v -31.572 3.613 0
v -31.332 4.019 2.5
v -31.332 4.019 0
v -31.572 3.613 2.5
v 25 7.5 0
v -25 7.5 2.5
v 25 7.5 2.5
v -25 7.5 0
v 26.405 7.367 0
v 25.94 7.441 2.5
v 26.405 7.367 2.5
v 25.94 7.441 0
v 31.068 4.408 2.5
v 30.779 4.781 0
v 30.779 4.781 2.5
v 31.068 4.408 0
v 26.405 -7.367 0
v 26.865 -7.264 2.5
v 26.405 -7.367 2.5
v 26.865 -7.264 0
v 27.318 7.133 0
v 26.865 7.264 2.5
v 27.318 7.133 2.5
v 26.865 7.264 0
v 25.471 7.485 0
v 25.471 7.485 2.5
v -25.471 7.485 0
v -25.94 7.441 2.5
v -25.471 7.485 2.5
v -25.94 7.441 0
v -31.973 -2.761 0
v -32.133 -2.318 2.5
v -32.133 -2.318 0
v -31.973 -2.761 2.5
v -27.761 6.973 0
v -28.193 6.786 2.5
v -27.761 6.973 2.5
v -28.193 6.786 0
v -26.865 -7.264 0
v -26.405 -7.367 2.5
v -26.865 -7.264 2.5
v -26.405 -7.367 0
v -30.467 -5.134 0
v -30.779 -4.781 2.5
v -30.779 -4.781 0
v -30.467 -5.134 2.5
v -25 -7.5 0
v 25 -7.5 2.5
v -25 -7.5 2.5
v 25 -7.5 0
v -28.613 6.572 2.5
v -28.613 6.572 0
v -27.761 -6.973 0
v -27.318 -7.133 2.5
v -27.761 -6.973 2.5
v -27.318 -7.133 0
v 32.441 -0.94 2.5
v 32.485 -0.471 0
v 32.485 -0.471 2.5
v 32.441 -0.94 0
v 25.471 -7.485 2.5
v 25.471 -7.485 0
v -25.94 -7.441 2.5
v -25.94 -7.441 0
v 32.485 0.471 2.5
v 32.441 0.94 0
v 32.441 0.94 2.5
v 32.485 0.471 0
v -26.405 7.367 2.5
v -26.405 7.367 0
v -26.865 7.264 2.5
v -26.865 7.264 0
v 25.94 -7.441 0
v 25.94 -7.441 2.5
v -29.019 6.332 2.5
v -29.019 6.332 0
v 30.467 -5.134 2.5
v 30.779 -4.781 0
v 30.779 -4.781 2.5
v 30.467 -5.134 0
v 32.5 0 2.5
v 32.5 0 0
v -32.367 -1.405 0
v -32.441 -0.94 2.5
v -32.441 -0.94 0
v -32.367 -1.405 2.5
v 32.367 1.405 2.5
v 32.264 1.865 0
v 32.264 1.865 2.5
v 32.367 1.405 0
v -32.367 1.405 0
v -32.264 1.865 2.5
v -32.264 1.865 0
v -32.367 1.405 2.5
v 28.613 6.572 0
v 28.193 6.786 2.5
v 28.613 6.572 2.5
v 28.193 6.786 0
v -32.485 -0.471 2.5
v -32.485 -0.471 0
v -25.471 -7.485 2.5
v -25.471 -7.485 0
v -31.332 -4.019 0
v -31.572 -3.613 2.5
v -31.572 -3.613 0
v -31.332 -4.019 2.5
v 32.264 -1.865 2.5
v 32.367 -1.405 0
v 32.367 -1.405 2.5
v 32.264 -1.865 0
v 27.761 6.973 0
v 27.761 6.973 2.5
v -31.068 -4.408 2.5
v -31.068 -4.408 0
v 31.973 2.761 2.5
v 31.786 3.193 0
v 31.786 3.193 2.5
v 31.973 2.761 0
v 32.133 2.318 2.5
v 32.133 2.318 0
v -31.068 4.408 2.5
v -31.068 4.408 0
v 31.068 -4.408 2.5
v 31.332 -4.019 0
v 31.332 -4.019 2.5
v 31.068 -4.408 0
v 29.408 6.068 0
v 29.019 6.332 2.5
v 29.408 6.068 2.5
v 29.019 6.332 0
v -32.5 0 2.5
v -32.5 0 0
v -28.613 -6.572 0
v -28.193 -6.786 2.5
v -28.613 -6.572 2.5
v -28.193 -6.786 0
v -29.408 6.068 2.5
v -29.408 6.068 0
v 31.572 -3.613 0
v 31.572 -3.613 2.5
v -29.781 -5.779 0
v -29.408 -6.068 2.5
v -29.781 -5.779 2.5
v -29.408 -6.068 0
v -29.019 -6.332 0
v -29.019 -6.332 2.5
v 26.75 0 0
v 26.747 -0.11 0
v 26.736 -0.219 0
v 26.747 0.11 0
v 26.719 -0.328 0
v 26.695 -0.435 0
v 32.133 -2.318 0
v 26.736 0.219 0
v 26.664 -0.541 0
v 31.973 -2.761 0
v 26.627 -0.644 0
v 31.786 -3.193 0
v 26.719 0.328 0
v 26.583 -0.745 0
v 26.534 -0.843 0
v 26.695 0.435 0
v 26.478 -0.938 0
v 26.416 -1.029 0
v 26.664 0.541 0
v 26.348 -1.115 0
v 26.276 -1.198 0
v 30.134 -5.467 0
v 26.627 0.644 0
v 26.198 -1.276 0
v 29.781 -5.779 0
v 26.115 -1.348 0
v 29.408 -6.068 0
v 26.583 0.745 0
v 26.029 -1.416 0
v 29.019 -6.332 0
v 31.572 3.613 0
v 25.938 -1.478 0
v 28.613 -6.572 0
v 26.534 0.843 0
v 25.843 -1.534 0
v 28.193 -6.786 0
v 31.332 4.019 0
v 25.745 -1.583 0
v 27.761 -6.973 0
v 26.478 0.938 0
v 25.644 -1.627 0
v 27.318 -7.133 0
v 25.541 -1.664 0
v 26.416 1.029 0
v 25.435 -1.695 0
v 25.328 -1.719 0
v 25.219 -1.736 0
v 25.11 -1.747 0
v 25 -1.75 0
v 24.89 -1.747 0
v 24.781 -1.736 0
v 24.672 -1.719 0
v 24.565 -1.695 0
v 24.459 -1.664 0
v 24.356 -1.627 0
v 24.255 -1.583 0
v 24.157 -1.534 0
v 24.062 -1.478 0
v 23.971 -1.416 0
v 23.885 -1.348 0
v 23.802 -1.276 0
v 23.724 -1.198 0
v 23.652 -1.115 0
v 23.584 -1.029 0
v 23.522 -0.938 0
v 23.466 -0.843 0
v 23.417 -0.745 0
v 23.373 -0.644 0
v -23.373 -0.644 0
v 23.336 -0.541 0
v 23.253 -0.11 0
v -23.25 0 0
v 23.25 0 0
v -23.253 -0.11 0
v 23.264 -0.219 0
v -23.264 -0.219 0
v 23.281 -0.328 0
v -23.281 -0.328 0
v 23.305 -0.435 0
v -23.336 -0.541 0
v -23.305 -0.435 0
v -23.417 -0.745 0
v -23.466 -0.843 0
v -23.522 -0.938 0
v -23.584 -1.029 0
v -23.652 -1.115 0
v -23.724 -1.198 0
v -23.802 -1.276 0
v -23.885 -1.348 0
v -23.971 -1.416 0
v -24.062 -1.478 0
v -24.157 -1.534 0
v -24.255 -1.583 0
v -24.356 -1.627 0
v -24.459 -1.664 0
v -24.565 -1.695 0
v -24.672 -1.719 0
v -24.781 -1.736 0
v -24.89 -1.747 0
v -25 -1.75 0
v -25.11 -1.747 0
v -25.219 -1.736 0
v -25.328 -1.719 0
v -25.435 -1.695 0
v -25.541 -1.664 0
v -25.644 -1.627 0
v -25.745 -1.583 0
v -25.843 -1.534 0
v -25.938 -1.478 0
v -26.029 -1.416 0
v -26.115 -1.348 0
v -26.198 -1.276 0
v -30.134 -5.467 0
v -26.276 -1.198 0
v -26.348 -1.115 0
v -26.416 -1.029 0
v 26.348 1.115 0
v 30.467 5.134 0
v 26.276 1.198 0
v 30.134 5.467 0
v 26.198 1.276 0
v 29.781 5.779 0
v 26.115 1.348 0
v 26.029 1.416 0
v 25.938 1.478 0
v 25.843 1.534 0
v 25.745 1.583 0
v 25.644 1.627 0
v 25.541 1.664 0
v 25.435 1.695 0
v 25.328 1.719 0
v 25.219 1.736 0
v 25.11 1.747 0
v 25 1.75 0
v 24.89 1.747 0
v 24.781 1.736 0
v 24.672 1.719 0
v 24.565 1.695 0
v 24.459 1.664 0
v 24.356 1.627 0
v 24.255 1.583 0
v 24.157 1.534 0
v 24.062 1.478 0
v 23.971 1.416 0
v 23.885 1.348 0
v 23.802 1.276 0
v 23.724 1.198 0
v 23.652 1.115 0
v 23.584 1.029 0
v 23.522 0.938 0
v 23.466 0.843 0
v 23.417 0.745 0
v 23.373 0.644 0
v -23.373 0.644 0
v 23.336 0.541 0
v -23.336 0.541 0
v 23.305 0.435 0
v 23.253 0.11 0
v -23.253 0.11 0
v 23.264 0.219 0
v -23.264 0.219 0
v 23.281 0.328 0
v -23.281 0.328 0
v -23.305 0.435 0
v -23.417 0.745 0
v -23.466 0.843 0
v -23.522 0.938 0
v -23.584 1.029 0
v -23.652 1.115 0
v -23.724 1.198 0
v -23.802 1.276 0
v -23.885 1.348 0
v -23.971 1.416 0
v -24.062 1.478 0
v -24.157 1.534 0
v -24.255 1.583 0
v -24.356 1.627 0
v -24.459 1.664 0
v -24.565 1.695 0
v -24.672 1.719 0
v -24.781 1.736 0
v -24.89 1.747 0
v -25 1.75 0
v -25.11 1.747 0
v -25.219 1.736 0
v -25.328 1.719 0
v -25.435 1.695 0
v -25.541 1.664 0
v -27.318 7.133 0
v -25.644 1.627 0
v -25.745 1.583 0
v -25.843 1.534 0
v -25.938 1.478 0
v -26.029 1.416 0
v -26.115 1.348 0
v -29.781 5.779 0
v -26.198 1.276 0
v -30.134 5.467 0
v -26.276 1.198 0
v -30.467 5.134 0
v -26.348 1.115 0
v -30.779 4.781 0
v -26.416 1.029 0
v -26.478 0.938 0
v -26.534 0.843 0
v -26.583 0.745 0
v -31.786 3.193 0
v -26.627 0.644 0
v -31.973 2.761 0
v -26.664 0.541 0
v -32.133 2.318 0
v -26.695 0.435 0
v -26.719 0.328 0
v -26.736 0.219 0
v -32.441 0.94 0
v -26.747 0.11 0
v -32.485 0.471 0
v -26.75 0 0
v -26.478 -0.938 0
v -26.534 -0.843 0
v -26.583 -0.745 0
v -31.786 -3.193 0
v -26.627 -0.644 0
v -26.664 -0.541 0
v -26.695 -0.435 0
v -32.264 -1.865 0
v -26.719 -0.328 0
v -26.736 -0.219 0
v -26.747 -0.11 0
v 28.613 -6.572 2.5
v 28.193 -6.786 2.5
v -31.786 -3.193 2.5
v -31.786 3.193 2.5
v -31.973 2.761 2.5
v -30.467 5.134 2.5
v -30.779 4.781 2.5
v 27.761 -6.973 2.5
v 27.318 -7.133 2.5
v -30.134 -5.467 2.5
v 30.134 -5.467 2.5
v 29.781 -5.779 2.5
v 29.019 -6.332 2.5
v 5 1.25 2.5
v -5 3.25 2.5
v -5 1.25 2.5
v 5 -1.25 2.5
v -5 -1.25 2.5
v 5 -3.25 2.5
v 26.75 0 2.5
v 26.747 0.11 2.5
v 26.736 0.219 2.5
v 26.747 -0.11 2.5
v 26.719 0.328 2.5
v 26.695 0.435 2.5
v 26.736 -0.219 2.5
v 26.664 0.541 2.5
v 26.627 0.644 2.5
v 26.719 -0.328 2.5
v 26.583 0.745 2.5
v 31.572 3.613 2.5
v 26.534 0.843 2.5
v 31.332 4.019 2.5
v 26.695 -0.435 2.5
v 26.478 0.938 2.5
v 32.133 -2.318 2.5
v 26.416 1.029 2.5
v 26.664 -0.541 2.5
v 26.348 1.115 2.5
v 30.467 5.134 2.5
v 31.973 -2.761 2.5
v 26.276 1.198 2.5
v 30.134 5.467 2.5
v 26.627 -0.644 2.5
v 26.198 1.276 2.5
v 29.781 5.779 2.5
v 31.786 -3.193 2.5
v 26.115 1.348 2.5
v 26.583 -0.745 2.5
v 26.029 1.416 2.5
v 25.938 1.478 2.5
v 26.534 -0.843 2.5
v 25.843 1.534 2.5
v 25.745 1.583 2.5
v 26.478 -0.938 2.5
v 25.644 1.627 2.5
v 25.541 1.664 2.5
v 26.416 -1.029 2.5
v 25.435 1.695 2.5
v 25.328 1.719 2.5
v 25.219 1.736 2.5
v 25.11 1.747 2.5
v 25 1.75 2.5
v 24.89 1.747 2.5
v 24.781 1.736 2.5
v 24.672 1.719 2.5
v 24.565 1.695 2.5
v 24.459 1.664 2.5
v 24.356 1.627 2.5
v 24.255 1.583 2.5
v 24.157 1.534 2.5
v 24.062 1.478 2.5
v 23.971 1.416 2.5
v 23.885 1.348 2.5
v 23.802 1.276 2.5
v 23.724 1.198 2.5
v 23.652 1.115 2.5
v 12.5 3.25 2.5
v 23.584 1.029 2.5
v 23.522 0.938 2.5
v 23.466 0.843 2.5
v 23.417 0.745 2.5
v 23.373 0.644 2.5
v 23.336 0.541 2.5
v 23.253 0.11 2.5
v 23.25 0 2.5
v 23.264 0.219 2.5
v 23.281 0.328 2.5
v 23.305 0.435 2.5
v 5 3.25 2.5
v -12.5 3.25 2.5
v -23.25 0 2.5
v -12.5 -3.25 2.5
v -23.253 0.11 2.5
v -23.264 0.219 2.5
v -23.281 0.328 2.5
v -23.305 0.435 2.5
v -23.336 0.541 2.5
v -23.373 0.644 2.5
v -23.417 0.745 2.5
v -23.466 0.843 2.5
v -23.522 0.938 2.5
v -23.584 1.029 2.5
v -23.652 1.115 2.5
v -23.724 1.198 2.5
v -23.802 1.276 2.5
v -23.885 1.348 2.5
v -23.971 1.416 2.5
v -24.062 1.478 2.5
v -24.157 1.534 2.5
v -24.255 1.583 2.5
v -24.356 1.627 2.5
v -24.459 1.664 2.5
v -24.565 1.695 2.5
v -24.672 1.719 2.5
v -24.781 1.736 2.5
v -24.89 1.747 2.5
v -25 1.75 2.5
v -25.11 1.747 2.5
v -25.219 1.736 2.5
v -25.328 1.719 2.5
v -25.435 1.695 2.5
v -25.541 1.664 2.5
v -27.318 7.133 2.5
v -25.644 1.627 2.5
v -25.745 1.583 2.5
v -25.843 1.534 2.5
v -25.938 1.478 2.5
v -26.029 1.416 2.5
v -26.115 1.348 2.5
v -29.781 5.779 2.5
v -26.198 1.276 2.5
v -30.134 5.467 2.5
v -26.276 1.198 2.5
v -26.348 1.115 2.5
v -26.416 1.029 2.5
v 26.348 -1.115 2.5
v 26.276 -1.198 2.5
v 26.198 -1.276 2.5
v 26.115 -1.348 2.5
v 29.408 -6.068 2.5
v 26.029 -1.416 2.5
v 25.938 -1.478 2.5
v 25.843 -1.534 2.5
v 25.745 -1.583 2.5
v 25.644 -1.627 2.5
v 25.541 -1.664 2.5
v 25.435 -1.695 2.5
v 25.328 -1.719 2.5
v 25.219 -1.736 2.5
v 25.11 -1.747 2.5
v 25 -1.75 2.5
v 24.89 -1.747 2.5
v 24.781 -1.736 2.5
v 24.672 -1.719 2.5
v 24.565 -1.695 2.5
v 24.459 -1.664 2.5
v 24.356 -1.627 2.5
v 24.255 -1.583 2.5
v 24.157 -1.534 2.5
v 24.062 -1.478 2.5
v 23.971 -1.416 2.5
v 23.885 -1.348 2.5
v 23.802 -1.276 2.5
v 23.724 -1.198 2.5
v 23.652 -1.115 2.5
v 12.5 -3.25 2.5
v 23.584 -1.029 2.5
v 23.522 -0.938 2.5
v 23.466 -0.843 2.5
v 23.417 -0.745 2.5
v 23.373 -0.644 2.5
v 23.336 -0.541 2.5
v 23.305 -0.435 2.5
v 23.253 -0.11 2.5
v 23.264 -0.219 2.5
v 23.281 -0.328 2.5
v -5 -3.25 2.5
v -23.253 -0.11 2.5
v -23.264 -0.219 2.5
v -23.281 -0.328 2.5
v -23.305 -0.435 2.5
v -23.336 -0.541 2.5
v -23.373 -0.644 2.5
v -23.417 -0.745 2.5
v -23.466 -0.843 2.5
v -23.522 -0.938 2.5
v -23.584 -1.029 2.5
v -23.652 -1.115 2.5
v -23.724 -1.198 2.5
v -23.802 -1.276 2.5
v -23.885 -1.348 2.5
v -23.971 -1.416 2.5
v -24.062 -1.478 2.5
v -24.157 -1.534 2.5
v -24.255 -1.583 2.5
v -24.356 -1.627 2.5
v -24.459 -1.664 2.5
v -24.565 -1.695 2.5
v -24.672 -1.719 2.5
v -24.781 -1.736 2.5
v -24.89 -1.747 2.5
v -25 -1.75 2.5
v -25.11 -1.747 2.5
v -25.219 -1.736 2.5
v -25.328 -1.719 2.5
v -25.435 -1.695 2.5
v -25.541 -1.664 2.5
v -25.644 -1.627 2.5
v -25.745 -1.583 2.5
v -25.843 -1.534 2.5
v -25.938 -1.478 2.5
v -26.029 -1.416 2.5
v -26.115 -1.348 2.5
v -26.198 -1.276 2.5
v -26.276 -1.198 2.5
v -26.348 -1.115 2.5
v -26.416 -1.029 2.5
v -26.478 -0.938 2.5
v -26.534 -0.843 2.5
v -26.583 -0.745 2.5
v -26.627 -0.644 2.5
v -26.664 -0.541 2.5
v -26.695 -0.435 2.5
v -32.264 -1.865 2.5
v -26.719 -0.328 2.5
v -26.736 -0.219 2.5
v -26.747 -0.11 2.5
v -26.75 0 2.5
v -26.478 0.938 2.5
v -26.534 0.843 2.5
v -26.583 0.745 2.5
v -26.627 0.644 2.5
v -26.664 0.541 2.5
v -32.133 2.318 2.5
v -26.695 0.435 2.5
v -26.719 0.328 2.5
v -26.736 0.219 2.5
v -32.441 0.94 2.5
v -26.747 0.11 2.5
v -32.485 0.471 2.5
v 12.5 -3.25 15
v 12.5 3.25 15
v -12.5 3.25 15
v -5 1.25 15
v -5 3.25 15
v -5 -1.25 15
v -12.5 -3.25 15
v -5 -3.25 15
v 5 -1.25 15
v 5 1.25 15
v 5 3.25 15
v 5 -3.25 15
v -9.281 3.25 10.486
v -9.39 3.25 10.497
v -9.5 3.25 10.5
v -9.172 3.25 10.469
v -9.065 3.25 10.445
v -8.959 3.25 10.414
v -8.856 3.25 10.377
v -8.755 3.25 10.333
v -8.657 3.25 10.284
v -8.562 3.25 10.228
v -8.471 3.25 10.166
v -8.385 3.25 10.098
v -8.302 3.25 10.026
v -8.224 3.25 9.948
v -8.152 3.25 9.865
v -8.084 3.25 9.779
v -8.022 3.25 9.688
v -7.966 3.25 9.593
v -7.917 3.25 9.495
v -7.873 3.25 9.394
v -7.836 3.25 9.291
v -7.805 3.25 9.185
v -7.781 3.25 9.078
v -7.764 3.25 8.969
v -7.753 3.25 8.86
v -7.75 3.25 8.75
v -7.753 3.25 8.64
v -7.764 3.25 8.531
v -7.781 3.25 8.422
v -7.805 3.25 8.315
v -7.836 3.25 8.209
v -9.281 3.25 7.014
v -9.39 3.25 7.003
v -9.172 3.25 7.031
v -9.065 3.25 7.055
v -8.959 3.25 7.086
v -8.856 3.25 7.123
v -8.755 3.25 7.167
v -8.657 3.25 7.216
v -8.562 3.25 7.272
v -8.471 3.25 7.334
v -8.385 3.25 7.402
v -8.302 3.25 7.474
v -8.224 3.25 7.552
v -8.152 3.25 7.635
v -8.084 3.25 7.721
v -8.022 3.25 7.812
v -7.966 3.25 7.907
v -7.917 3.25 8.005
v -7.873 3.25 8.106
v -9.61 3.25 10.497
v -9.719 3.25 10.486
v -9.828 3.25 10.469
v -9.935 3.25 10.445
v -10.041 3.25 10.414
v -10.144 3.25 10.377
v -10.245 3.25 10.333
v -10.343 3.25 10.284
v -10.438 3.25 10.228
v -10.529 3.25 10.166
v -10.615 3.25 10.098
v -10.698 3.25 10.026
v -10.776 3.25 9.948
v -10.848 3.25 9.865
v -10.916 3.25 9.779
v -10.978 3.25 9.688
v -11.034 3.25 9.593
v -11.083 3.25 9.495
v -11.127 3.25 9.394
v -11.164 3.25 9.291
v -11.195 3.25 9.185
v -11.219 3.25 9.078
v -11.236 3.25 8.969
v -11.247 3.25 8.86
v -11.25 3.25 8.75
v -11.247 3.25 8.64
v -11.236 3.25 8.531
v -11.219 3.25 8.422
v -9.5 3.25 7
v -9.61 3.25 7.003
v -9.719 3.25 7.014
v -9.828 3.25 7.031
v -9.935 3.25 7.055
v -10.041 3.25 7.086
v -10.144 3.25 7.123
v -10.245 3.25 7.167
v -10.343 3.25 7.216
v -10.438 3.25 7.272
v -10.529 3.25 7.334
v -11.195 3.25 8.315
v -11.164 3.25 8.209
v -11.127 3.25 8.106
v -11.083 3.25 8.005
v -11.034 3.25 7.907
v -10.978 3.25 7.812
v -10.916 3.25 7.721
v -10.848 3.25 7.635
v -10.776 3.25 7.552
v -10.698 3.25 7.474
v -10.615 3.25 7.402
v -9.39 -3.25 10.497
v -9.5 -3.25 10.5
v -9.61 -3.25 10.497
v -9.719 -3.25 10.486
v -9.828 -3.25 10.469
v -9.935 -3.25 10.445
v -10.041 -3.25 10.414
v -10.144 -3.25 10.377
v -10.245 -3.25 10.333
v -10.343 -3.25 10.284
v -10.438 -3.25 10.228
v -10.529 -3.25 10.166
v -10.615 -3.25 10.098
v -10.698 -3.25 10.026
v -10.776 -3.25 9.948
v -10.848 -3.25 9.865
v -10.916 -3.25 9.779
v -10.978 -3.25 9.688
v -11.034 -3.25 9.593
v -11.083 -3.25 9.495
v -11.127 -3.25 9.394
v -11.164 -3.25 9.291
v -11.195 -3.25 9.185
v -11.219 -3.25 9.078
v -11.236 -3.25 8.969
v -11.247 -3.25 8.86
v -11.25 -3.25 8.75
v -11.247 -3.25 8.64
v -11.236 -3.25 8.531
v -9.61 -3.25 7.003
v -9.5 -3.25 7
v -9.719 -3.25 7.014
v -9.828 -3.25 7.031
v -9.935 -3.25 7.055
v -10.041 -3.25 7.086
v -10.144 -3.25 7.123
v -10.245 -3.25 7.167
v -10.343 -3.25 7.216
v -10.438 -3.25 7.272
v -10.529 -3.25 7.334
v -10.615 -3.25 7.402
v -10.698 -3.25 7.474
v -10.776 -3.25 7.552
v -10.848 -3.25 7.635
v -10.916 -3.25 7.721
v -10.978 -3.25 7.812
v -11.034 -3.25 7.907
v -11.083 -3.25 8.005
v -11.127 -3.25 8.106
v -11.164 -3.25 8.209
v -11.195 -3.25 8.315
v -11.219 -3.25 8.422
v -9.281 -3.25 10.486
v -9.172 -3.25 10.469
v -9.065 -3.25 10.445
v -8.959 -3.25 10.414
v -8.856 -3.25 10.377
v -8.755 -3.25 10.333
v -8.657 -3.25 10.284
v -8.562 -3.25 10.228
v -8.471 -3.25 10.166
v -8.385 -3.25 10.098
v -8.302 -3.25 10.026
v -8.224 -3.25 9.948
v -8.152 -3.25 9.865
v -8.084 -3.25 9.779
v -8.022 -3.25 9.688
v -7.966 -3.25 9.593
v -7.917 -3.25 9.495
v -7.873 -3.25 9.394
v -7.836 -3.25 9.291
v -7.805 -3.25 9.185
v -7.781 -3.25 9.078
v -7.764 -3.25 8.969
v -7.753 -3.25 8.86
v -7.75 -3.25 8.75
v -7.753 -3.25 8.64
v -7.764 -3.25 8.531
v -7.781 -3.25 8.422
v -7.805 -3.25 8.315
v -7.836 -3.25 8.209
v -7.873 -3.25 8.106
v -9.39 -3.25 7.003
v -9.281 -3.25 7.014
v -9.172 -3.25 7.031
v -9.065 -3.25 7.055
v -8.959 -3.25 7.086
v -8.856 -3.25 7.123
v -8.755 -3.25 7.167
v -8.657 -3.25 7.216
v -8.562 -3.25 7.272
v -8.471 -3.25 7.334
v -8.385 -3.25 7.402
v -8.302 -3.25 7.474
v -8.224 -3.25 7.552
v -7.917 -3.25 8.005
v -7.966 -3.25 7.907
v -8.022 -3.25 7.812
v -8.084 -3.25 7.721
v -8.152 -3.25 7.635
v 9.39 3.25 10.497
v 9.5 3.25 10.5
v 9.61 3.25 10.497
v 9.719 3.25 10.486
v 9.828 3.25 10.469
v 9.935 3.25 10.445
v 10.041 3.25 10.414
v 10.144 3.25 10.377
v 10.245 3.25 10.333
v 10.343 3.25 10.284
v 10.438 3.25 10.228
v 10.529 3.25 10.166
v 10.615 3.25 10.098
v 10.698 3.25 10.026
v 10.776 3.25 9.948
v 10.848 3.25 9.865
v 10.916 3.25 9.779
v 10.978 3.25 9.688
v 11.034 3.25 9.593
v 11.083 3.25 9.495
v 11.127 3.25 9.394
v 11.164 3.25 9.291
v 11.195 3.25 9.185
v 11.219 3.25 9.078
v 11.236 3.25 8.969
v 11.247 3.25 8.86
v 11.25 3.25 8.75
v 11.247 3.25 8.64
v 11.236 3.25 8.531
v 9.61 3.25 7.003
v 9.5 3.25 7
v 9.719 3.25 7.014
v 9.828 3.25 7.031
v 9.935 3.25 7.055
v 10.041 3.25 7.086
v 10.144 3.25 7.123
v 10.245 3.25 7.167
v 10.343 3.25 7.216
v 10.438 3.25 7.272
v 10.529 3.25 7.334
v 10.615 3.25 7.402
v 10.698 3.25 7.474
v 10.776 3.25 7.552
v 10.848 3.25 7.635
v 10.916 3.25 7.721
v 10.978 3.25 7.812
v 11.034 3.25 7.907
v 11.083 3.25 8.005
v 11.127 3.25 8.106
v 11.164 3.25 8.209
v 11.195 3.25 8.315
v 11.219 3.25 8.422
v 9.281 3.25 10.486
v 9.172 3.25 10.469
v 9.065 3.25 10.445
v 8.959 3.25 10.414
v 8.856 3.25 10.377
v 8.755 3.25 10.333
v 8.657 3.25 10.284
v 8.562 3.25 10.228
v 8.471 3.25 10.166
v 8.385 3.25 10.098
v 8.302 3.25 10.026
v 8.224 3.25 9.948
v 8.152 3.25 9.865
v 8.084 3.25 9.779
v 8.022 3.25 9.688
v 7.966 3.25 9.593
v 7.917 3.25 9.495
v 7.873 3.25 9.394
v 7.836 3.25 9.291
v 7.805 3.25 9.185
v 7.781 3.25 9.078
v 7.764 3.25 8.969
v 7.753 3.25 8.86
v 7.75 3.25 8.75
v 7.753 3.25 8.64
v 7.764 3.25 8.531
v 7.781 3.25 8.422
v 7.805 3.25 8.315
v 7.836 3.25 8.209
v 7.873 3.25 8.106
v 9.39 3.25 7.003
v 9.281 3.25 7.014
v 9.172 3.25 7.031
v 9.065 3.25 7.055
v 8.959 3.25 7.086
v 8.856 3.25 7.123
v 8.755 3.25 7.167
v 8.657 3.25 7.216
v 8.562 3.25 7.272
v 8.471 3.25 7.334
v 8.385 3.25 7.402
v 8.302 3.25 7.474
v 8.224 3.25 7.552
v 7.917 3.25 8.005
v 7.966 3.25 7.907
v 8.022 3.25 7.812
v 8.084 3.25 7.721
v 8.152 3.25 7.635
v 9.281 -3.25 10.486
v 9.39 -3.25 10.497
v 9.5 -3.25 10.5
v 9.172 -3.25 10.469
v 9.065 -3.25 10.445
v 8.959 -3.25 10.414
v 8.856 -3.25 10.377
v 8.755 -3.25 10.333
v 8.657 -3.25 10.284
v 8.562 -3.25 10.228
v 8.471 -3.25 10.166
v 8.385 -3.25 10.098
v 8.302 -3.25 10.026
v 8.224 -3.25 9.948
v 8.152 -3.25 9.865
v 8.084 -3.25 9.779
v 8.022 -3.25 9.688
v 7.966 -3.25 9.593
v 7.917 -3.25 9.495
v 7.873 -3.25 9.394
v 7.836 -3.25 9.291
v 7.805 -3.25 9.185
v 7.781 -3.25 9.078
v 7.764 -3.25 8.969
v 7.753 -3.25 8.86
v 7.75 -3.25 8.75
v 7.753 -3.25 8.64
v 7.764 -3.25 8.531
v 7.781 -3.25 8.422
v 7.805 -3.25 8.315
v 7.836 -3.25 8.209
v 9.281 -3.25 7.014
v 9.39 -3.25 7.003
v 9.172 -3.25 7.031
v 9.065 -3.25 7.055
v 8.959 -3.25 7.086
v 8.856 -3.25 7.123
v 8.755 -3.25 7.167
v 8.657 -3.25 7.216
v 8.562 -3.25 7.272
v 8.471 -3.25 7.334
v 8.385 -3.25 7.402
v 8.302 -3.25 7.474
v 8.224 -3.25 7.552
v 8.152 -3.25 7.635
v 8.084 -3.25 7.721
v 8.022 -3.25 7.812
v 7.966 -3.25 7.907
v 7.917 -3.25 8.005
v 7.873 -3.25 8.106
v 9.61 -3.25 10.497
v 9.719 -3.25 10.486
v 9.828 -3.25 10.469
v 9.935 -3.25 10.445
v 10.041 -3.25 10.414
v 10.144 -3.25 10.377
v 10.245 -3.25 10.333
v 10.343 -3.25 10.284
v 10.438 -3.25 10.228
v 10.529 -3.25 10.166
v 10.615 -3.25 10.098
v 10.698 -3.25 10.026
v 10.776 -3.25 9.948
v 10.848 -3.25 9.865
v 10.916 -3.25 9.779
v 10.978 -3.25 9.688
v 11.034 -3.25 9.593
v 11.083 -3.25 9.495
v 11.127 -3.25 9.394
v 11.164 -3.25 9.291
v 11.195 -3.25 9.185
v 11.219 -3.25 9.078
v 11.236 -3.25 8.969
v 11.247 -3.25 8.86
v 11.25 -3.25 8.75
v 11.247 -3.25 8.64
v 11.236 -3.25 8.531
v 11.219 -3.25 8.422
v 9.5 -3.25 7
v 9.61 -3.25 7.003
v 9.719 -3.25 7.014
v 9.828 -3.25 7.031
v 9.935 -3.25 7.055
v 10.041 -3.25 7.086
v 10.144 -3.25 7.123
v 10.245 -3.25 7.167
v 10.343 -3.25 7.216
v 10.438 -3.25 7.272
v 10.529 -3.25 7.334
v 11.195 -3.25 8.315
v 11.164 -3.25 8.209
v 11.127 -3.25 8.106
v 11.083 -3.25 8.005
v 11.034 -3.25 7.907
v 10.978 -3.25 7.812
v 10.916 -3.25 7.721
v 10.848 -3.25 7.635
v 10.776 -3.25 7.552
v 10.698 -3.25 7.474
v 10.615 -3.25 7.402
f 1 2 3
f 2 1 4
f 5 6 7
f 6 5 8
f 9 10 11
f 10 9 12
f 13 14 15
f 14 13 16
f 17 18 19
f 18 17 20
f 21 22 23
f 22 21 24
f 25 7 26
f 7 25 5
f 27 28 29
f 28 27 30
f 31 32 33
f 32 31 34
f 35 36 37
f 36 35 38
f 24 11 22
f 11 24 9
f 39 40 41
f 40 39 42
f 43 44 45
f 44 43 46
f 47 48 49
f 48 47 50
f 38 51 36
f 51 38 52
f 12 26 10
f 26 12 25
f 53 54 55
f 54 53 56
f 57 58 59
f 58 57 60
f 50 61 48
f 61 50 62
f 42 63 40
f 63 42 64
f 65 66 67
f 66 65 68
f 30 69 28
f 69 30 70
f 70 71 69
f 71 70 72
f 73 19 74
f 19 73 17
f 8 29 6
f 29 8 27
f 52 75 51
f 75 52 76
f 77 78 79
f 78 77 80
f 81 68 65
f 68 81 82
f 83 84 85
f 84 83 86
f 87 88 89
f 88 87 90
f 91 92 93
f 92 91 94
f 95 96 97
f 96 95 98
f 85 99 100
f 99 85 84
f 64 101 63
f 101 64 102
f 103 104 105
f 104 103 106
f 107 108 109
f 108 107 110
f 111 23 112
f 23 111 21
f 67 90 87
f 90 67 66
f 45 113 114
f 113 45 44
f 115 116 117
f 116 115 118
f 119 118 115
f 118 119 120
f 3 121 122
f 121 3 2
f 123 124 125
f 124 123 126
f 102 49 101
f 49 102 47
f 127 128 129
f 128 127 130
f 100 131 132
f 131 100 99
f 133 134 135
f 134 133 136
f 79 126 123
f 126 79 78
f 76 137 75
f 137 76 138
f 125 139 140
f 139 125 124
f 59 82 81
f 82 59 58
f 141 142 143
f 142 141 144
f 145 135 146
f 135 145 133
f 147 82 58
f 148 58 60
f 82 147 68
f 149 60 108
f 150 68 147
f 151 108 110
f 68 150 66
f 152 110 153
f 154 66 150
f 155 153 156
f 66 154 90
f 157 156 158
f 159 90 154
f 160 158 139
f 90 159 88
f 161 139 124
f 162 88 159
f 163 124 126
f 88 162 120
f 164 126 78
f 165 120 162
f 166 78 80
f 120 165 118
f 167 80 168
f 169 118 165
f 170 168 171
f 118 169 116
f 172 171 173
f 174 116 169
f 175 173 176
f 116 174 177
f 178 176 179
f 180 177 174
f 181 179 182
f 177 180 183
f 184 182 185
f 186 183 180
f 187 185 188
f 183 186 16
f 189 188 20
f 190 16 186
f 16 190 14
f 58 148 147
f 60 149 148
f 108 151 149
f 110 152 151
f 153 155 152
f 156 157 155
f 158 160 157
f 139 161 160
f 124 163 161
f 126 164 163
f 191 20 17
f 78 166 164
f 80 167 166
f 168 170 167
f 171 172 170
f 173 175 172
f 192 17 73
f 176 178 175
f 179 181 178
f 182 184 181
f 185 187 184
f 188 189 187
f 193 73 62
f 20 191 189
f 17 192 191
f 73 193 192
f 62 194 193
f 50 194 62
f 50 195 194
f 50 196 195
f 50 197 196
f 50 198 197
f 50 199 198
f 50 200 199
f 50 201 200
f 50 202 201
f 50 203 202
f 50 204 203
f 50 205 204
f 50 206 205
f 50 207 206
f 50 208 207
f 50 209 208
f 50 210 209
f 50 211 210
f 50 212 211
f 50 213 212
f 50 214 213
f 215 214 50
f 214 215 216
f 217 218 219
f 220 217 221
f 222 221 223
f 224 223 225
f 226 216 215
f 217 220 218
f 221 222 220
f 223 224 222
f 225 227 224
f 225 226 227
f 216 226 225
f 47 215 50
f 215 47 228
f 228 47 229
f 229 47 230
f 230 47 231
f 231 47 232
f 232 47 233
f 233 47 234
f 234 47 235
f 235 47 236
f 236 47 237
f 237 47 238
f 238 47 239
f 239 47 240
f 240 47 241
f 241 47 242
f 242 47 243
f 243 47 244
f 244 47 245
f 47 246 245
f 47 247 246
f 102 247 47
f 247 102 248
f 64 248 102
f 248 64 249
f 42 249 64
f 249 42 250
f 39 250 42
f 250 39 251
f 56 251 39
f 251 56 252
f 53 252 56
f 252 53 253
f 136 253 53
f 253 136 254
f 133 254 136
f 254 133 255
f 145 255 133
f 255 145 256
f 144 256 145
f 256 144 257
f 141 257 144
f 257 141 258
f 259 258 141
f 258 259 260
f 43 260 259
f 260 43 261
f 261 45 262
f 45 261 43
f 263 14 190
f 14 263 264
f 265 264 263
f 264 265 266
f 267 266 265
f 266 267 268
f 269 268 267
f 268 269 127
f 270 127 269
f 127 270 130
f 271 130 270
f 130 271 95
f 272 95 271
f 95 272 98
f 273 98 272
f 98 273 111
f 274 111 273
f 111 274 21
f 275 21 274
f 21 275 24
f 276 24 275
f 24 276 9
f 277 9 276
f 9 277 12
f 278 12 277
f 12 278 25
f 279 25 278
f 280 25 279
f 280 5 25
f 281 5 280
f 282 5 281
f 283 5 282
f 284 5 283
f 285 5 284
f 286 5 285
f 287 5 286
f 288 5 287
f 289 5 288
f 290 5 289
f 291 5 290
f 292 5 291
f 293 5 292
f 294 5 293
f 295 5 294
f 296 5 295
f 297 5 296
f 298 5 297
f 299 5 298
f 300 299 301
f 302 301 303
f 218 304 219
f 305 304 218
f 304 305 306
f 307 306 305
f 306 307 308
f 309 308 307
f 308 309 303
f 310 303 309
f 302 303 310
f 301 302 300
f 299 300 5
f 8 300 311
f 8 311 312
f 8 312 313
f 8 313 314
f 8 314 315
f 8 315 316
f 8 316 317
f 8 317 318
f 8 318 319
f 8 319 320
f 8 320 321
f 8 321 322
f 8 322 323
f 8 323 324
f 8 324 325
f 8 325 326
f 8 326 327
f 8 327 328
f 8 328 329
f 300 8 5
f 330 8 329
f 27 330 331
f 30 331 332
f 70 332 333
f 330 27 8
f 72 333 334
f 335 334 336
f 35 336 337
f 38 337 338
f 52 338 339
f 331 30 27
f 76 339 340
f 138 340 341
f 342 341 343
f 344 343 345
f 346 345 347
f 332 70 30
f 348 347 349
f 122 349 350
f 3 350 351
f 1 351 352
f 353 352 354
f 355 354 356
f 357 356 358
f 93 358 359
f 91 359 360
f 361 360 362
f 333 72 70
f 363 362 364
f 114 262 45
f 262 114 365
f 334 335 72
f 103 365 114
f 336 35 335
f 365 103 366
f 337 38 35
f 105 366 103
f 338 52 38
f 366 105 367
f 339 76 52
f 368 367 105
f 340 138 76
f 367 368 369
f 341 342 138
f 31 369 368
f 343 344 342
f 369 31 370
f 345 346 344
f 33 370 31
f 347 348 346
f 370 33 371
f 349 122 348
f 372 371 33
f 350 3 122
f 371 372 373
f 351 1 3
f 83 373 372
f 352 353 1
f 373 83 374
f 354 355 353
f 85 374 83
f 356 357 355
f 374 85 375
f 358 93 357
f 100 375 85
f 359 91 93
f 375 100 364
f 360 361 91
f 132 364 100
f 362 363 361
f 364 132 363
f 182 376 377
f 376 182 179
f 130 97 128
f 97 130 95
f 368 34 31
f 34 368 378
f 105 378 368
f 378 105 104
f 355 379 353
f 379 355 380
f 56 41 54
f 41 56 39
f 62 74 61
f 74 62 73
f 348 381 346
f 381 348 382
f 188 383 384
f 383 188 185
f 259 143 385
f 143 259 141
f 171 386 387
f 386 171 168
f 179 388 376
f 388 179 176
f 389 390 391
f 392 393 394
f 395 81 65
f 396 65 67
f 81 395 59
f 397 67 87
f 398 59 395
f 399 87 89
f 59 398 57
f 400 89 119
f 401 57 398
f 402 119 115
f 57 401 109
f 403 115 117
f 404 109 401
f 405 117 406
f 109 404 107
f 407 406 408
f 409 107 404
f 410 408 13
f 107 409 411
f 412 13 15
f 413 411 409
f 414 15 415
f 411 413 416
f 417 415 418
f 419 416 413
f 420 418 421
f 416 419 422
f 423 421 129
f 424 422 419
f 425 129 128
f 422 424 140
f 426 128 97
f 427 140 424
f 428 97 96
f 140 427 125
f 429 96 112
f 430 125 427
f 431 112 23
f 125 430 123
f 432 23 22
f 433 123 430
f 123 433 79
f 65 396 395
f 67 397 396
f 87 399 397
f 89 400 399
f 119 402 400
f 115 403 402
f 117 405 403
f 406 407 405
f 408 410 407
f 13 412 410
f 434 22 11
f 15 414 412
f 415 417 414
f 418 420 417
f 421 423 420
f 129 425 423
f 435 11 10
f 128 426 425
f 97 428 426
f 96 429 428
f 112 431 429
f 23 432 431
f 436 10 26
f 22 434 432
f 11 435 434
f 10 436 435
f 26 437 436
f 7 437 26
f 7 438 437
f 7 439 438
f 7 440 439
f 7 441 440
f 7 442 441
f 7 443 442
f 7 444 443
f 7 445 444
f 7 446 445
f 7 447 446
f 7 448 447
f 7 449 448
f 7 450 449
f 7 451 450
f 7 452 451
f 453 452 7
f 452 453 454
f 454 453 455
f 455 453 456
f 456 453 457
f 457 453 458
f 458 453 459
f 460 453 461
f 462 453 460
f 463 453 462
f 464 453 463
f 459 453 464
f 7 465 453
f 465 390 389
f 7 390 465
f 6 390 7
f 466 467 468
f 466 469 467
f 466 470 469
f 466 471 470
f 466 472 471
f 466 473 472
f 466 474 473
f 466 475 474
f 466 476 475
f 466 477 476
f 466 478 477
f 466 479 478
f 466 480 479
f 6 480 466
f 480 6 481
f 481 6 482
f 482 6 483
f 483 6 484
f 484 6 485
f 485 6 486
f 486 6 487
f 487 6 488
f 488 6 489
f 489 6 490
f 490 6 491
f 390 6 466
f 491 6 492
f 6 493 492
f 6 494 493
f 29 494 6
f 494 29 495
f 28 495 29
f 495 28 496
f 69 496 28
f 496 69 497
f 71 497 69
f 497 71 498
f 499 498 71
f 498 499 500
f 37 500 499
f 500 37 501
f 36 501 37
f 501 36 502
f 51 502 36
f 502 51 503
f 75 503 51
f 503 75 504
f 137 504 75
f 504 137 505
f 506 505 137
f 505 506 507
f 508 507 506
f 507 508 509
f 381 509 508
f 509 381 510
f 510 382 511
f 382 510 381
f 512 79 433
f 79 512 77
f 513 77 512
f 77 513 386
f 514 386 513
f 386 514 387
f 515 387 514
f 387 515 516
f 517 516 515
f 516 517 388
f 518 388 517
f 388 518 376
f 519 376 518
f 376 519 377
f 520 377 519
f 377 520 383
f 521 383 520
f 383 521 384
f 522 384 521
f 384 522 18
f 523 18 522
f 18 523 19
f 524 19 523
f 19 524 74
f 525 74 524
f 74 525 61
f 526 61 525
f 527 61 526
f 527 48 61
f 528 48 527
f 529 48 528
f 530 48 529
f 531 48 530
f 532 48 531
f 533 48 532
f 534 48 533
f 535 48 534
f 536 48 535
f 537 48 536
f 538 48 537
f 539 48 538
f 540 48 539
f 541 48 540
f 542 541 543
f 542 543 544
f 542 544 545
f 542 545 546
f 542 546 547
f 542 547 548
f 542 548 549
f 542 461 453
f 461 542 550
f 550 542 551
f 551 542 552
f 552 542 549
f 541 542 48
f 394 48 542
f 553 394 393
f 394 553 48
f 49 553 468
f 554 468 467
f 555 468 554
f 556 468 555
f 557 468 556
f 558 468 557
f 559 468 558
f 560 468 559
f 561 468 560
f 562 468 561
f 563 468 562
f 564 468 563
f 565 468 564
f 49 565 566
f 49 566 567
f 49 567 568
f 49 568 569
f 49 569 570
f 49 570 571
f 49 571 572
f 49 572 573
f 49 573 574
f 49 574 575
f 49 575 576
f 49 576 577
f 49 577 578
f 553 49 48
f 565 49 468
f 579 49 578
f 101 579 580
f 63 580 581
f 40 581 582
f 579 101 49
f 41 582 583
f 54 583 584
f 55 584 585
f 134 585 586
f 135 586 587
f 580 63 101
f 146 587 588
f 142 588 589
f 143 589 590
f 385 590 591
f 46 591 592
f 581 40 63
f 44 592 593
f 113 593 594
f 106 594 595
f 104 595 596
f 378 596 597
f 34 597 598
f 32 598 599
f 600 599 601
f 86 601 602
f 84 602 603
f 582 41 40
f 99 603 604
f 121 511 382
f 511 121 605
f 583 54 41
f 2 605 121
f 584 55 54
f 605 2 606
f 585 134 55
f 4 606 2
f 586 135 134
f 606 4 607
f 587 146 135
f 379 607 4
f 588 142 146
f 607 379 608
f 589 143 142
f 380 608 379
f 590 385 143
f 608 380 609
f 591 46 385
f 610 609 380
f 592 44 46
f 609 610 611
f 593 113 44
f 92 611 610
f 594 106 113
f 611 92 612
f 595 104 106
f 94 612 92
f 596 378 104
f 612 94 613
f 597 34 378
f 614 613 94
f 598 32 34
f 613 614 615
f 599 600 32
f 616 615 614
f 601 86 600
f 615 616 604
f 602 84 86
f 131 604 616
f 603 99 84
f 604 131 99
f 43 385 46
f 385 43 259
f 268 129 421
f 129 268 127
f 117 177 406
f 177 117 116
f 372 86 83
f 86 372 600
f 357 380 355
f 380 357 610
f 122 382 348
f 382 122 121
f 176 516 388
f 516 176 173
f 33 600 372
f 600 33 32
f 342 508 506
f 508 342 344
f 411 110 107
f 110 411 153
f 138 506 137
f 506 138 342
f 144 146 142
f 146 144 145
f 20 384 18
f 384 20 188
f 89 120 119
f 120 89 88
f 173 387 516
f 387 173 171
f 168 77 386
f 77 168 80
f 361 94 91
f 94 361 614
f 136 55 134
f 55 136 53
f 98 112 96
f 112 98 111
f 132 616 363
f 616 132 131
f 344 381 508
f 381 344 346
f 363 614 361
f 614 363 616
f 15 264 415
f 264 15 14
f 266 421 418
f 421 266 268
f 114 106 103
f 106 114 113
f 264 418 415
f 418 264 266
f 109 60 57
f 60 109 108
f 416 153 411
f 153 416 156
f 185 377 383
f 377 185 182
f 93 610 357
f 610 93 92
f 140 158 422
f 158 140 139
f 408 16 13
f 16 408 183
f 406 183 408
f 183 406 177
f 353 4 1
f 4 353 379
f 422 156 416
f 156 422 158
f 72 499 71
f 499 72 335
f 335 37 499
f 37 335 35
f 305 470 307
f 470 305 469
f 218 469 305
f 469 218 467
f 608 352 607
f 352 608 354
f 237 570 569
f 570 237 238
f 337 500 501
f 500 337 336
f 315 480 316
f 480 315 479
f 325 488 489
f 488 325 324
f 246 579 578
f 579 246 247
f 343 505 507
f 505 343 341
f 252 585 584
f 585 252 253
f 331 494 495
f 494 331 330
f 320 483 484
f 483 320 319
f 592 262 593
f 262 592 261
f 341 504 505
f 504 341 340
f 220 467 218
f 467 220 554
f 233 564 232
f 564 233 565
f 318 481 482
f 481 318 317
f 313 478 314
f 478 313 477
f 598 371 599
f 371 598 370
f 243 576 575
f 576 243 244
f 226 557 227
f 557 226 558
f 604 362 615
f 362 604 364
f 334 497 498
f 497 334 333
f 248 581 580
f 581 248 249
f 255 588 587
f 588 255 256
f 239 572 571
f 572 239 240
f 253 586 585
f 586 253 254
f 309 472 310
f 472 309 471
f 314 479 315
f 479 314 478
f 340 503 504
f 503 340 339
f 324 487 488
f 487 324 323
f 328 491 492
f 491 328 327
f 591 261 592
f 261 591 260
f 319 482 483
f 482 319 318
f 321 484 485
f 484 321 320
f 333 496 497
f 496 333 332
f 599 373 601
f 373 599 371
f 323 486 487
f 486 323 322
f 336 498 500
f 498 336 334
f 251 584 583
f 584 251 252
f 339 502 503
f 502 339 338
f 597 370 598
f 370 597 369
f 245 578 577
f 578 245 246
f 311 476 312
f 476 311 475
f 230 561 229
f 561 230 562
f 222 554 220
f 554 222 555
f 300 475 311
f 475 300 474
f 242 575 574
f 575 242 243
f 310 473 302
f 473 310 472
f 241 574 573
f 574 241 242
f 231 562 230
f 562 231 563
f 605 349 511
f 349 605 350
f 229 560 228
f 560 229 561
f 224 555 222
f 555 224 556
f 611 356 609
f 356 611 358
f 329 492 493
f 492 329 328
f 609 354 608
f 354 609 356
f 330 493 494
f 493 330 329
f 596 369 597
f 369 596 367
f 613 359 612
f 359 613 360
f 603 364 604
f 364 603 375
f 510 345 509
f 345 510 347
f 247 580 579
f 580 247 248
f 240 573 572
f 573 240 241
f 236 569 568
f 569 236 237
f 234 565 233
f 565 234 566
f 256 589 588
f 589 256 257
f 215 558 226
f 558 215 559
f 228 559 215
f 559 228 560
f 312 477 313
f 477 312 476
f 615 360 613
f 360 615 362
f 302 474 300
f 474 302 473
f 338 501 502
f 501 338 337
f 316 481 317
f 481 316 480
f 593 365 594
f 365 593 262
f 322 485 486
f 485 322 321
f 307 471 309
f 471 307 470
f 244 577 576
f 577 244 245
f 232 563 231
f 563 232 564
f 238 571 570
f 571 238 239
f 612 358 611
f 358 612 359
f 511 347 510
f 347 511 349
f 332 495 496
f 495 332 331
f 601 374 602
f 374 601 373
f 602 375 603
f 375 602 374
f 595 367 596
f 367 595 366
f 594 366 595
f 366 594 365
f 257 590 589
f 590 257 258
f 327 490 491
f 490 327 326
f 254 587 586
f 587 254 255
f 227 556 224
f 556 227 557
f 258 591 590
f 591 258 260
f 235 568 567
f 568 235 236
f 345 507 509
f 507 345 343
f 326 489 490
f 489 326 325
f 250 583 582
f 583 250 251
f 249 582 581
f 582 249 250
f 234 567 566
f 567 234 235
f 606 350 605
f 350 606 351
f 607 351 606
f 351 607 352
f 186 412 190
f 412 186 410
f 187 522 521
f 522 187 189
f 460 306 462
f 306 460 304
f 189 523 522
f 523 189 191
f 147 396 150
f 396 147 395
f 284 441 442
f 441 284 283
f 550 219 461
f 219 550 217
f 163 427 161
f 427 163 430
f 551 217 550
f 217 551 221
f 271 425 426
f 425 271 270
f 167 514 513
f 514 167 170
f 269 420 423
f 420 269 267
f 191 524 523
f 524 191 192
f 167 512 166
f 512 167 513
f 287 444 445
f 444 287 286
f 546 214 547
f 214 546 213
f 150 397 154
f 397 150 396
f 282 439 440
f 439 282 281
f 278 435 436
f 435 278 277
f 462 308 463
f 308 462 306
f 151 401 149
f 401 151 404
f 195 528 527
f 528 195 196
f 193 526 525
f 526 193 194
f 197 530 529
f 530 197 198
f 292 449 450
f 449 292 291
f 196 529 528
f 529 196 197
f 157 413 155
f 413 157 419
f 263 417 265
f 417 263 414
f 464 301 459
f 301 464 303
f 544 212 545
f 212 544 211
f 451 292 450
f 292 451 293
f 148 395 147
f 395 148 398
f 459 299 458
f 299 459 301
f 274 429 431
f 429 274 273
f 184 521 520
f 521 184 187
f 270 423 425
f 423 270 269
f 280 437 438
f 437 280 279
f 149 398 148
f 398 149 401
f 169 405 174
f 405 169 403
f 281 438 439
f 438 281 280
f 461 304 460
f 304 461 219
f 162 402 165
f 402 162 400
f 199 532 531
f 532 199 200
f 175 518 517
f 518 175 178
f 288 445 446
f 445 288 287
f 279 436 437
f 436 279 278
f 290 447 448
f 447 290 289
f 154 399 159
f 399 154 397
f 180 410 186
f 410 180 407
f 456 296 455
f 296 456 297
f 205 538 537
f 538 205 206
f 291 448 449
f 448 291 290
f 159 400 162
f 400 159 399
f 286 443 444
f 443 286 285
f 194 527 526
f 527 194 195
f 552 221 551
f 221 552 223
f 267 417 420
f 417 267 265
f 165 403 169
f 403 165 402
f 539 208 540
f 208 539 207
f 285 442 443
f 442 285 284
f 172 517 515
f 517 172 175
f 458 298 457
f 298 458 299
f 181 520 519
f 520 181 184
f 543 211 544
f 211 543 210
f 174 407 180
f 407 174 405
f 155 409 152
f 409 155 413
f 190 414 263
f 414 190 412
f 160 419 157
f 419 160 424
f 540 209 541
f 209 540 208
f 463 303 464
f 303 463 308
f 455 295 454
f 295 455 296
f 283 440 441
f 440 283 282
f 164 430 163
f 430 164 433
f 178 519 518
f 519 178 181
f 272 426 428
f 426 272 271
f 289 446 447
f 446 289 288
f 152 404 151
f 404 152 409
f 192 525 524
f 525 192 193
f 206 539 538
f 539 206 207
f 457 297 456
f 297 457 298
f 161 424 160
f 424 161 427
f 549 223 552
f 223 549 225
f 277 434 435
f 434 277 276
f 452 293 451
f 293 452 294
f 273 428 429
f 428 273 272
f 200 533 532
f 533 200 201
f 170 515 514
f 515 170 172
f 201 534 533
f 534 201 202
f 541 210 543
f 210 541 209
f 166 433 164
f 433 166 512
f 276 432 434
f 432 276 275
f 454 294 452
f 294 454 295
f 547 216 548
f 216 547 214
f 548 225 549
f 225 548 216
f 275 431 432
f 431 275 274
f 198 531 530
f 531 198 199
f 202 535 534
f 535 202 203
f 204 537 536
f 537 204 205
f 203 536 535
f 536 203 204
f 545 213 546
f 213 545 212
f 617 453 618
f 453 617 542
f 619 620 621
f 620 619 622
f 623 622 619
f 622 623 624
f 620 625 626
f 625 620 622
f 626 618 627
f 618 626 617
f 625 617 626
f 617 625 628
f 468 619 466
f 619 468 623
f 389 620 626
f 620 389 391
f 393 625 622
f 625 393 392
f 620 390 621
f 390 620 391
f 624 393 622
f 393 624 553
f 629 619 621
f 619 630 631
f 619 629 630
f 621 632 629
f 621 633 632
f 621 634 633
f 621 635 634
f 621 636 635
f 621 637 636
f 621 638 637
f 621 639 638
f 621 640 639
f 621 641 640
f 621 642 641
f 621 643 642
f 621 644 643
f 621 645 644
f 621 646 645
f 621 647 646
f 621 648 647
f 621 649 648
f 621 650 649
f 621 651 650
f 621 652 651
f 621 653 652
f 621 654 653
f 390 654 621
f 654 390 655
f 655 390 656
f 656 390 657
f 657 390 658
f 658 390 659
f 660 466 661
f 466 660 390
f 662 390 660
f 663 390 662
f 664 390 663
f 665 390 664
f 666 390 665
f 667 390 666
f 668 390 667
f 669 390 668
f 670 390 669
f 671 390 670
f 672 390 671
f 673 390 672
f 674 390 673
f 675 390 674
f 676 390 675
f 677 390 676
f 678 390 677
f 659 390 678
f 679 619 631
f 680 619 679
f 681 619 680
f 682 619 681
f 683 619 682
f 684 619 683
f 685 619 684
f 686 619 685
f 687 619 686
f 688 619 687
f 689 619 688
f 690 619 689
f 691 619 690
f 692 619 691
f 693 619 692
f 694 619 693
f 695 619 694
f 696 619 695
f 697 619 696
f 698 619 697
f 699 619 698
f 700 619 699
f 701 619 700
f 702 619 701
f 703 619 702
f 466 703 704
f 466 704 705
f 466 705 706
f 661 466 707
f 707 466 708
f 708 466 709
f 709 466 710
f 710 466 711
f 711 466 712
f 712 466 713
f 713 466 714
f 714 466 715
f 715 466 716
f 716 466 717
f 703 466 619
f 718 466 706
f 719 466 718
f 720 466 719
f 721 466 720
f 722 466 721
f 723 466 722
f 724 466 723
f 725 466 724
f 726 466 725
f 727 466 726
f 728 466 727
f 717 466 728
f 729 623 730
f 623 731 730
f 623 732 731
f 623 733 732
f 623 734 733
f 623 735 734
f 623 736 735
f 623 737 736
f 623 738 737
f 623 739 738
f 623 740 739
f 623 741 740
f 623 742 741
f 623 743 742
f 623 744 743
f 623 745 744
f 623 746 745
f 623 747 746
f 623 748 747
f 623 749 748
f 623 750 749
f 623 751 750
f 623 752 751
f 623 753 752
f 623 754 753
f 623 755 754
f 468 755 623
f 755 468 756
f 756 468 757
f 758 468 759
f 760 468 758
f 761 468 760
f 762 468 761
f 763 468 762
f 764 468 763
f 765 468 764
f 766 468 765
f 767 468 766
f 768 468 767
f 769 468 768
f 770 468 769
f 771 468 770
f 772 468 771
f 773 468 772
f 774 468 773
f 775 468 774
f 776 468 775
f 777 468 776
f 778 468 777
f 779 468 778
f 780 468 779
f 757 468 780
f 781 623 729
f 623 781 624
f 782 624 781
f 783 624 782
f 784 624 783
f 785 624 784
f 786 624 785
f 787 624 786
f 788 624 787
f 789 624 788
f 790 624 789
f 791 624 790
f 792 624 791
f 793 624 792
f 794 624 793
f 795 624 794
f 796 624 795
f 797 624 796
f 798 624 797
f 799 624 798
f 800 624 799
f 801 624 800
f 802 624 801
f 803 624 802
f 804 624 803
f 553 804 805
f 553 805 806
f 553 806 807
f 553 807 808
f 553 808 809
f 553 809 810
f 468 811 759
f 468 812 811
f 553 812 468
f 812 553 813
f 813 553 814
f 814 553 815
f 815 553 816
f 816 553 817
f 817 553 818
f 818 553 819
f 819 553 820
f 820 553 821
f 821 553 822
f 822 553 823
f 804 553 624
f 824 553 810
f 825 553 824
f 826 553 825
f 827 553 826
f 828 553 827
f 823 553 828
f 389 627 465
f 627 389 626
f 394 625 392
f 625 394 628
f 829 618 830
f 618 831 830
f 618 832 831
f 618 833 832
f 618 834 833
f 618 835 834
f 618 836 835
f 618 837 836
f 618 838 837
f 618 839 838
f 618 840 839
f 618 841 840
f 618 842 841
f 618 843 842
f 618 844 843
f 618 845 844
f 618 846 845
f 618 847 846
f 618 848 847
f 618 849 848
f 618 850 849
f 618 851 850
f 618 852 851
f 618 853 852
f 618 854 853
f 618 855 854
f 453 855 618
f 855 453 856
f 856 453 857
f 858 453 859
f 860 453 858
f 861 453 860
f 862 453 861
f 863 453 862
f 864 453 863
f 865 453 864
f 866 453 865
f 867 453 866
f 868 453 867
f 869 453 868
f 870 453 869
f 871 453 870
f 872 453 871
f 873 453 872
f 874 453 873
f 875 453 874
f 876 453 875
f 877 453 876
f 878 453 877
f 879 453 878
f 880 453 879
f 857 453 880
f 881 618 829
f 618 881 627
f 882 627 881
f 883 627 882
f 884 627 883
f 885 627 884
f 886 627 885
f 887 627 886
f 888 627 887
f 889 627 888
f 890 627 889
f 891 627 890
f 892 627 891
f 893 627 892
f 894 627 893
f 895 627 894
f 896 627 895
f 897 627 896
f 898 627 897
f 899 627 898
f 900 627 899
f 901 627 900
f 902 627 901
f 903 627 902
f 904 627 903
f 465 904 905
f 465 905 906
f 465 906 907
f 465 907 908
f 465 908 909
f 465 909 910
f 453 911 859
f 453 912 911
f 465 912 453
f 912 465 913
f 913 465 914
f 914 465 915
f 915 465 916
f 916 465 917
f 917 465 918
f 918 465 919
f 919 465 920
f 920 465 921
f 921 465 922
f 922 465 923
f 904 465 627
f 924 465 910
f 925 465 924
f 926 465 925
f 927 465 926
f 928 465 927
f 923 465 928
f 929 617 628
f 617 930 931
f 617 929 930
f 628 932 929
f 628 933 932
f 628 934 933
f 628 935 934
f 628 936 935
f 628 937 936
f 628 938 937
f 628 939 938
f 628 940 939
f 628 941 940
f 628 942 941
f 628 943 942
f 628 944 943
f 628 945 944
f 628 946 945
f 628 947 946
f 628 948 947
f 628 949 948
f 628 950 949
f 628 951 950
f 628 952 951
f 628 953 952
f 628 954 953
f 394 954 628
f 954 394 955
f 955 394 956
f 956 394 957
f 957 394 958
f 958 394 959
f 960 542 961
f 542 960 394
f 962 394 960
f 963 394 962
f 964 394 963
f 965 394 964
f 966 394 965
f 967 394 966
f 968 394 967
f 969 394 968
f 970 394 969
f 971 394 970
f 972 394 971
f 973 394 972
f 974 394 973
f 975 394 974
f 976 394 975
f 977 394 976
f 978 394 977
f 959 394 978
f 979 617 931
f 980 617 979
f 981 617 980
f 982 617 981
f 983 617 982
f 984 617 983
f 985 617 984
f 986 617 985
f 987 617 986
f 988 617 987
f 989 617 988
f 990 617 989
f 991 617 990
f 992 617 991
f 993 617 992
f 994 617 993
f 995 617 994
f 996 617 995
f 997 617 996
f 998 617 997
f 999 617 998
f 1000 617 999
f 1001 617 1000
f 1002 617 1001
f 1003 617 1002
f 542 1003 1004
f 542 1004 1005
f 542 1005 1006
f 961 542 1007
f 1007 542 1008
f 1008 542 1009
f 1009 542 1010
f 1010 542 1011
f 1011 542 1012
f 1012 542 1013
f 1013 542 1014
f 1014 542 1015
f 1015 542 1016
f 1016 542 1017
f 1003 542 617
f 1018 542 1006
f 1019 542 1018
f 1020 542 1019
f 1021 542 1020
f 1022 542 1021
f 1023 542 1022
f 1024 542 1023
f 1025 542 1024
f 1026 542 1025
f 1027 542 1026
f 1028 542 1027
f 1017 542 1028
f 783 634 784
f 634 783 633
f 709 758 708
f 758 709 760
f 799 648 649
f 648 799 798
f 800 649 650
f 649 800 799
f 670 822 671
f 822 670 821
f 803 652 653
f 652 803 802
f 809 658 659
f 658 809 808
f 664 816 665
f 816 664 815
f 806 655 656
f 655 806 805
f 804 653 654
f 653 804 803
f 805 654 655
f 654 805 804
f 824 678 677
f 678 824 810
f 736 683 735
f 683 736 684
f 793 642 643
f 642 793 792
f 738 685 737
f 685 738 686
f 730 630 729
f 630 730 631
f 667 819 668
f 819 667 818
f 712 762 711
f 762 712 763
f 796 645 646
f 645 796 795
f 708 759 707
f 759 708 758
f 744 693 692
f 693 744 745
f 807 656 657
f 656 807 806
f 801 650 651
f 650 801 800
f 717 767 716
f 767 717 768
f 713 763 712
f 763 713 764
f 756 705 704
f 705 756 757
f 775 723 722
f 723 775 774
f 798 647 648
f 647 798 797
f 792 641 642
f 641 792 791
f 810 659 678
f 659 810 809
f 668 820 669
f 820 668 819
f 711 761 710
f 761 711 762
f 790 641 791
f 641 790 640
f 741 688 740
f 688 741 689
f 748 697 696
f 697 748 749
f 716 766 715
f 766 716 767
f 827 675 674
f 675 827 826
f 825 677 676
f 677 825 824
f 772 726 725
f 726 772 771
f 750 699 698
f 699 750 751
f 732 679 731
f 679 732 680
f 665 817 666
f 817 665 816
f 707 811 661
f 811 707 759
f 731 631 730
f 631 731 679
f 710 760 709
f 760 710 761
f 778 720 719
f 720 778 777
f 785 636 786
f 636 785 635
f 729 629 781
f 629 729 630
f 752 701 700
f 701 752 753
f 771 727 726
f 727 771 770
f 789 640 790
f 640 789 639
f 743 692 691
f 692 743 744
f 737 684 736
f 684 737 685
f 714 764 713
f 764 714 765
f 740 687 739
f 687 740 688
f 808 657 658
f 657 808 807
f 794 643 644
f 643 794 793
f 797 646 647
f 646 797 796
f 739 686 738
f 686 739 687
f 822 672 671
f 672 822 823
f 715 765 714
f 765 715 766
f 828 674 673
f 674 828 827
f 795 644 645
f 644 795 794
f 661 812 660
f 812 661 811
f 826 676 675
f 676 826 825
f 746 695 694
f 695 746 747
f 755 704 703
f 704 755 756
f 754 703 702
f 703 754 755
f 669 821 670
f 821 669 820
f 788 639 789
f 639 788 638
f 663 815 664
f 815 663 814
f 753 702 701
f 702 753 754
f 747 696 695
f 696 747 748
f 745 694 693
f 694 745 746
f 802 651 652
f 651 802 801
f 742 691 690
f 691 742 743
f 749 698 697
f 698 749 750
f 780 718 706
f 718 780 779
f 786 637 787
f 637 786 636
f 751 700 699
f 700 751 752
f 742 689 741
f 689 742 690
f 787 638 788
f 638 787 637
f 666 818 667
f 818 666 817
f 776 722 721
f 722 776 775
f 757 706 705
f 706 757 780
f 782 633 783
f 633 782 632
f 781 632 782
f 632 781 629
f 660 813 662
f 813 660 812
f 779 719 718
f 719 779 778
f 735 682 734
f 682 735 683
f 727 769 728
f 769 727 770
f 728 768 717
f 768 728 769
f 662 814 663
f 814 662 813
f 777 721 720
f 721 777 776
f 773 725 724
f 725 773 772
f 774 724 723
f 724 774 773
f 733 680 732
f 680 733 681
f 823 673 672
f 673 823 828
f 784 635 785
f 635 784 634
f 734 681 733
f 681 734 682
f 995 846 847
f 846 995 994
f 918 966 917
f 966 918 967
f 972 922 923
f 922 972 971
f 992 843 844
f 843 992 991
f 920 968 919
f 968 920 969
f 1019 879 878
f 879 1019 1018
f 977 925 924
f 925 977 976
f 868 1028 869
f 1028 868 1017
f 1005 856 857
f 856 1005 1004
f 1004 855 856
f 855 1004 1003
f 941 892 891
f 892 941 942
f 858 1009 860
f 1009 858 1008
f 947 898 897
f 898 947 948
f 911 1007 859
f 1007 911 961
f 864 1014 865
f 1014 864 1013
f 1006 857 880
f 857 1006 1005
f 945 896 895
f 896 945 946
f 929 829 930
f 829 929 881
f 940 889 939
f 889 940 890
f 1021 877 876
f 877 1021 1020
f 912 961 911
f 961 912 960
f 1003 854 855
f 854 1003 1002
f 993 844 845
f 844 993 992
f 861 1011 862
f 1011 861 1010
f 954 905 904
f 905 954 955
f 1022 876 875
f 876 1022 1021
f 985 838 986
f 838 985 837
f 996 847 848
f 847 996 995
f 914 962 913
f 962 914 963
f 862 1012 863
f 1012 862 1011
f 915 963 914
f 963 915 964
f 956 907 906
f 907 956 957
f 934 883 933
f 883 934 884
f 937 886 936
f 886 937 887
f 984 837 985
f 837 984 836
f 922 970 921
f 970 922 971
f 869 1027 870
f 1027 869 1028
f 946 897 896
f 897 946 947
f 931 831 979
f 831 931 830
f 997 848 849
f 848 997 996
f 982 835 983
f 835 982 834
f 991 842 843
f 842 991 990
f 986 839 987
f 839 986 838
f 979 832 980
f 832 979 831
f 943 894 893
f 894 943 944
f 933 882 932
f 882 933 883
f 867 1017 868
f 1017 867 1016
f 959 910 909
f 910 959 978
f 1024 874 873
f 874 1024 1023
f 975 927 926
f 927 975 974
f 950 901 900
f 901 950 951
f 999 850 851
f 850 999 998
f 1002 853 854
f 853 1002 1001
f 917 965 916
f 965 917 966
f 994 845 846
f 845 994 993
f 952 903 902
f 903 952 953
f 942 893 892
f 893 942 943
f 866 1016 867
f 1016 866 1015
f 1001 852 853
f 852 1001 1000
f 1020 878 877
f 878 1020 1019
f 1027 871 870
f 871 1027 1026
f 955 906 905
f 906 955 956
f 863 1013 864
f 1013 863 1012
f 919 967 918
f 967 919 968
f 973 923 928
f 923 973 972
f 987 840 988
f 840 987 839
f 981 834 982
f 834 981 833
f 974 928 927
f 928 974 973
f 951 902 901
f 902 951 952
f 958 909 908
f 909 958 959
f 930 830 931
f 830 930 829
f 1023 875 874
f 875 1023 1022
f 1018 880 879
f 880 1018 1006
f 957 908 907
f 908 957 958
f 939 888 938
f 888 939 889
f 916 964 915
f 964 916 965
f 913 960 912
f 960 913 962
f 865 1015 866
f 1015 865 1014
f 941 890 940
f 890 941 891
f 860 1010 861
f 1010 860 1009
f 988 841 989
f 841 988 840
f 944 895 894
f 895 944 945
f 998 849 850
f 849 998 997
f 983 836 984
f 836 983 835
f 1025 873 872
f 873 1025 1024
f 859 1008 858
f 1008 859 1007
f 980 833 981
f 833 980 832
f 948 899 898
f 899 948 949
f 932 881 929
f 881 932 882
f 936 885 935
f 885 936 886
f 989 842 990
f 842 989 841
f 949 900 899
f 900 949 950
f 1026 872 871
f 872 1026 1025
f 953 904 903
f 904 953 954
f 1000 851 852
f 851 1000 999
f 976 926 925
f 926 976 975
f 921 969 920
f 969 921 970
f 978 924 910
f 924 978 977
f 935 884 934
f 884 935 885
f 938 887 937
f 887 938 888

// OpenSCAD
// file: opto_endstop_v1.scad
translate([20.75,0,-5.25])
    rotate ([0,0,180])
        opto_endstop();


module opto_endstop(){
 difference(){
  union(){
  // base PCB
   color("green") cube([33.0,1.6,10.5]);
  // add the switch module
   translate([8.4,1.6,10.5/2-6.4/2]) optoswitch();
   // connector
   translate([0.2,-7,0]) color("white") cube([5.8,7,10.5]);
   // led
   translate([3.5,1.6,10.5/2-1.5/2]) color("red") cube([2,0.7,1.5]);
  }
   translate([8.4,0,10.5/2-6.4/2]) {
   for ( hole = [2.75,24.5-2.75] ){
    rotate([90,0,0]) translate([hole,6.4/2,-4]) cylinder(r=1.5, h=4.5,$fn=40);
   }
  }
 }
}

// switch module
module optoswitch() {
 difference(){
  union (){
   color("gray") cube([24.5,3.5,6.4]);
   color("gray")translate([6.63,0,0]) cube([4.45,11.3,6.3]);
   color("gray")translate([13.63,0,0]) cube([4.45,11.3,6.3]);
  }
   for ( hole = [2.75,24.5-2.75] ){
 	rotate([90,0,0]) translate([hole,6.4/2,-4]) cylinder(r=1.5, h=4.5,$fn=40);
   }
 }
}
// main file
use <opto_endstop_v1.scad>

$fn=100;

bolt_dia = 3.5;
bolt_circle_dia = 43.815;
hole_dia = 18;
wall_thick = 2.5;
/*
module vertical_holder()
{
    difference()
    {
        translate([21-wall_thick,-12.5,0])
            cube([wall_thick,25,15]);
        translate([21-wall_thick-0.001,-9.5,10])
            rotate([0,90,0])
                cylinder(d=bolt_dia,h=wall_thick+0.002);
        translate([21-wall_thick-0.001,9.5,10])
            rotate([0,90,0])
                cylinder(d=bolt_dia,h=wall_thick+0.002);
    }
    hull()
    {
        translate([21-wall_thick,-0.5*wall_thick,wall_thick])
            rotate([-90,0,0])
                cylinder(d=0.001,h=wall_thick);
        translate([21-wall_thick,-0.5*wall_thick,15])
            rotate([-90,0,0])
                cylinder(d=0.001,h=wall_thick);
        translate([hole_dia /2 +1,-0.5*wall_thick,wall_thick])
            rotate([-90,0,0])
                cylinder(d=0.001,h=wall_thick);
    }
}

module y_endstop()
{
vertical_holder();
mirror([1,0,0])
    vertical_holder();


difference()
{
    translate([-21,-21,0])
        cube([42,42,wall_thick]);
    // Motor mount holes
    for(i=[0:3])
    {
        rotate([0,0,45 + 90 * i])
        {
            translate([bolt_circle_dia / 2, 0,-0.001])
            {
                cylinder(d=bolt_dia,h= wall_thick+0.002);
            }
        }
    }
    // Motor center hole
    translate([0,0,-0.001])
    {
        cylinder(d=hole_dia,h= wall_thick + 0.002);
    }
}
}
*/

module y_endstop()
{
    difference()
    {
        hull()
        {
            translate([-25,0,0])
                cylinder(d=15,h= wall_thick);
            translate([25,0,0])
                cylinder(d=15,h= wall_thick);
        }
        translate([-25,0,-0.001])
        {
            cylinder(d=bolt_dia,h= wall_thick + 0.002);
        }
        translate([25,0,-0.001])
        {
            cylinder(d=bolt_dia,h= wall_thick + 0.002);
        }
    }
    difference()
    {
        union()
        {
            translate([-12.5,wall_thick*-0.5,0])
                cube([25,wall_thick,15]);
            translate([-12.5,wall_thick*-0.5-2,0])
                cube([7.5,wall_thick+4,15]);
            translate([5,wall_thick*-0.5-2,0])
                cube([7.5,wall_thick+4,15]);
        }
        translate([-9.5,wall_thick*-0.5-2.001,wall_thick+6.25])
            rotate([-90,0,0])
                cylinder(d=bolt_dia,h= wall_thick+4.002);
        translate([9.5,wall_thick*-0.5-2.001,wall_thick+6.25])
            rotate([-90,0,0])
                cylinder(d=bolt_dia,h= wall_thick+4.002);
    }
}

y_endstop();
/*
translate([20.75,wall_thick*-0.5-2,wall_thick+1])
    rotate ([0,0,180])
        opto_endstop();
translate([-20.75,wall_thick*0.5+2,wall_thick+1])
    opto_endstop();
*/
